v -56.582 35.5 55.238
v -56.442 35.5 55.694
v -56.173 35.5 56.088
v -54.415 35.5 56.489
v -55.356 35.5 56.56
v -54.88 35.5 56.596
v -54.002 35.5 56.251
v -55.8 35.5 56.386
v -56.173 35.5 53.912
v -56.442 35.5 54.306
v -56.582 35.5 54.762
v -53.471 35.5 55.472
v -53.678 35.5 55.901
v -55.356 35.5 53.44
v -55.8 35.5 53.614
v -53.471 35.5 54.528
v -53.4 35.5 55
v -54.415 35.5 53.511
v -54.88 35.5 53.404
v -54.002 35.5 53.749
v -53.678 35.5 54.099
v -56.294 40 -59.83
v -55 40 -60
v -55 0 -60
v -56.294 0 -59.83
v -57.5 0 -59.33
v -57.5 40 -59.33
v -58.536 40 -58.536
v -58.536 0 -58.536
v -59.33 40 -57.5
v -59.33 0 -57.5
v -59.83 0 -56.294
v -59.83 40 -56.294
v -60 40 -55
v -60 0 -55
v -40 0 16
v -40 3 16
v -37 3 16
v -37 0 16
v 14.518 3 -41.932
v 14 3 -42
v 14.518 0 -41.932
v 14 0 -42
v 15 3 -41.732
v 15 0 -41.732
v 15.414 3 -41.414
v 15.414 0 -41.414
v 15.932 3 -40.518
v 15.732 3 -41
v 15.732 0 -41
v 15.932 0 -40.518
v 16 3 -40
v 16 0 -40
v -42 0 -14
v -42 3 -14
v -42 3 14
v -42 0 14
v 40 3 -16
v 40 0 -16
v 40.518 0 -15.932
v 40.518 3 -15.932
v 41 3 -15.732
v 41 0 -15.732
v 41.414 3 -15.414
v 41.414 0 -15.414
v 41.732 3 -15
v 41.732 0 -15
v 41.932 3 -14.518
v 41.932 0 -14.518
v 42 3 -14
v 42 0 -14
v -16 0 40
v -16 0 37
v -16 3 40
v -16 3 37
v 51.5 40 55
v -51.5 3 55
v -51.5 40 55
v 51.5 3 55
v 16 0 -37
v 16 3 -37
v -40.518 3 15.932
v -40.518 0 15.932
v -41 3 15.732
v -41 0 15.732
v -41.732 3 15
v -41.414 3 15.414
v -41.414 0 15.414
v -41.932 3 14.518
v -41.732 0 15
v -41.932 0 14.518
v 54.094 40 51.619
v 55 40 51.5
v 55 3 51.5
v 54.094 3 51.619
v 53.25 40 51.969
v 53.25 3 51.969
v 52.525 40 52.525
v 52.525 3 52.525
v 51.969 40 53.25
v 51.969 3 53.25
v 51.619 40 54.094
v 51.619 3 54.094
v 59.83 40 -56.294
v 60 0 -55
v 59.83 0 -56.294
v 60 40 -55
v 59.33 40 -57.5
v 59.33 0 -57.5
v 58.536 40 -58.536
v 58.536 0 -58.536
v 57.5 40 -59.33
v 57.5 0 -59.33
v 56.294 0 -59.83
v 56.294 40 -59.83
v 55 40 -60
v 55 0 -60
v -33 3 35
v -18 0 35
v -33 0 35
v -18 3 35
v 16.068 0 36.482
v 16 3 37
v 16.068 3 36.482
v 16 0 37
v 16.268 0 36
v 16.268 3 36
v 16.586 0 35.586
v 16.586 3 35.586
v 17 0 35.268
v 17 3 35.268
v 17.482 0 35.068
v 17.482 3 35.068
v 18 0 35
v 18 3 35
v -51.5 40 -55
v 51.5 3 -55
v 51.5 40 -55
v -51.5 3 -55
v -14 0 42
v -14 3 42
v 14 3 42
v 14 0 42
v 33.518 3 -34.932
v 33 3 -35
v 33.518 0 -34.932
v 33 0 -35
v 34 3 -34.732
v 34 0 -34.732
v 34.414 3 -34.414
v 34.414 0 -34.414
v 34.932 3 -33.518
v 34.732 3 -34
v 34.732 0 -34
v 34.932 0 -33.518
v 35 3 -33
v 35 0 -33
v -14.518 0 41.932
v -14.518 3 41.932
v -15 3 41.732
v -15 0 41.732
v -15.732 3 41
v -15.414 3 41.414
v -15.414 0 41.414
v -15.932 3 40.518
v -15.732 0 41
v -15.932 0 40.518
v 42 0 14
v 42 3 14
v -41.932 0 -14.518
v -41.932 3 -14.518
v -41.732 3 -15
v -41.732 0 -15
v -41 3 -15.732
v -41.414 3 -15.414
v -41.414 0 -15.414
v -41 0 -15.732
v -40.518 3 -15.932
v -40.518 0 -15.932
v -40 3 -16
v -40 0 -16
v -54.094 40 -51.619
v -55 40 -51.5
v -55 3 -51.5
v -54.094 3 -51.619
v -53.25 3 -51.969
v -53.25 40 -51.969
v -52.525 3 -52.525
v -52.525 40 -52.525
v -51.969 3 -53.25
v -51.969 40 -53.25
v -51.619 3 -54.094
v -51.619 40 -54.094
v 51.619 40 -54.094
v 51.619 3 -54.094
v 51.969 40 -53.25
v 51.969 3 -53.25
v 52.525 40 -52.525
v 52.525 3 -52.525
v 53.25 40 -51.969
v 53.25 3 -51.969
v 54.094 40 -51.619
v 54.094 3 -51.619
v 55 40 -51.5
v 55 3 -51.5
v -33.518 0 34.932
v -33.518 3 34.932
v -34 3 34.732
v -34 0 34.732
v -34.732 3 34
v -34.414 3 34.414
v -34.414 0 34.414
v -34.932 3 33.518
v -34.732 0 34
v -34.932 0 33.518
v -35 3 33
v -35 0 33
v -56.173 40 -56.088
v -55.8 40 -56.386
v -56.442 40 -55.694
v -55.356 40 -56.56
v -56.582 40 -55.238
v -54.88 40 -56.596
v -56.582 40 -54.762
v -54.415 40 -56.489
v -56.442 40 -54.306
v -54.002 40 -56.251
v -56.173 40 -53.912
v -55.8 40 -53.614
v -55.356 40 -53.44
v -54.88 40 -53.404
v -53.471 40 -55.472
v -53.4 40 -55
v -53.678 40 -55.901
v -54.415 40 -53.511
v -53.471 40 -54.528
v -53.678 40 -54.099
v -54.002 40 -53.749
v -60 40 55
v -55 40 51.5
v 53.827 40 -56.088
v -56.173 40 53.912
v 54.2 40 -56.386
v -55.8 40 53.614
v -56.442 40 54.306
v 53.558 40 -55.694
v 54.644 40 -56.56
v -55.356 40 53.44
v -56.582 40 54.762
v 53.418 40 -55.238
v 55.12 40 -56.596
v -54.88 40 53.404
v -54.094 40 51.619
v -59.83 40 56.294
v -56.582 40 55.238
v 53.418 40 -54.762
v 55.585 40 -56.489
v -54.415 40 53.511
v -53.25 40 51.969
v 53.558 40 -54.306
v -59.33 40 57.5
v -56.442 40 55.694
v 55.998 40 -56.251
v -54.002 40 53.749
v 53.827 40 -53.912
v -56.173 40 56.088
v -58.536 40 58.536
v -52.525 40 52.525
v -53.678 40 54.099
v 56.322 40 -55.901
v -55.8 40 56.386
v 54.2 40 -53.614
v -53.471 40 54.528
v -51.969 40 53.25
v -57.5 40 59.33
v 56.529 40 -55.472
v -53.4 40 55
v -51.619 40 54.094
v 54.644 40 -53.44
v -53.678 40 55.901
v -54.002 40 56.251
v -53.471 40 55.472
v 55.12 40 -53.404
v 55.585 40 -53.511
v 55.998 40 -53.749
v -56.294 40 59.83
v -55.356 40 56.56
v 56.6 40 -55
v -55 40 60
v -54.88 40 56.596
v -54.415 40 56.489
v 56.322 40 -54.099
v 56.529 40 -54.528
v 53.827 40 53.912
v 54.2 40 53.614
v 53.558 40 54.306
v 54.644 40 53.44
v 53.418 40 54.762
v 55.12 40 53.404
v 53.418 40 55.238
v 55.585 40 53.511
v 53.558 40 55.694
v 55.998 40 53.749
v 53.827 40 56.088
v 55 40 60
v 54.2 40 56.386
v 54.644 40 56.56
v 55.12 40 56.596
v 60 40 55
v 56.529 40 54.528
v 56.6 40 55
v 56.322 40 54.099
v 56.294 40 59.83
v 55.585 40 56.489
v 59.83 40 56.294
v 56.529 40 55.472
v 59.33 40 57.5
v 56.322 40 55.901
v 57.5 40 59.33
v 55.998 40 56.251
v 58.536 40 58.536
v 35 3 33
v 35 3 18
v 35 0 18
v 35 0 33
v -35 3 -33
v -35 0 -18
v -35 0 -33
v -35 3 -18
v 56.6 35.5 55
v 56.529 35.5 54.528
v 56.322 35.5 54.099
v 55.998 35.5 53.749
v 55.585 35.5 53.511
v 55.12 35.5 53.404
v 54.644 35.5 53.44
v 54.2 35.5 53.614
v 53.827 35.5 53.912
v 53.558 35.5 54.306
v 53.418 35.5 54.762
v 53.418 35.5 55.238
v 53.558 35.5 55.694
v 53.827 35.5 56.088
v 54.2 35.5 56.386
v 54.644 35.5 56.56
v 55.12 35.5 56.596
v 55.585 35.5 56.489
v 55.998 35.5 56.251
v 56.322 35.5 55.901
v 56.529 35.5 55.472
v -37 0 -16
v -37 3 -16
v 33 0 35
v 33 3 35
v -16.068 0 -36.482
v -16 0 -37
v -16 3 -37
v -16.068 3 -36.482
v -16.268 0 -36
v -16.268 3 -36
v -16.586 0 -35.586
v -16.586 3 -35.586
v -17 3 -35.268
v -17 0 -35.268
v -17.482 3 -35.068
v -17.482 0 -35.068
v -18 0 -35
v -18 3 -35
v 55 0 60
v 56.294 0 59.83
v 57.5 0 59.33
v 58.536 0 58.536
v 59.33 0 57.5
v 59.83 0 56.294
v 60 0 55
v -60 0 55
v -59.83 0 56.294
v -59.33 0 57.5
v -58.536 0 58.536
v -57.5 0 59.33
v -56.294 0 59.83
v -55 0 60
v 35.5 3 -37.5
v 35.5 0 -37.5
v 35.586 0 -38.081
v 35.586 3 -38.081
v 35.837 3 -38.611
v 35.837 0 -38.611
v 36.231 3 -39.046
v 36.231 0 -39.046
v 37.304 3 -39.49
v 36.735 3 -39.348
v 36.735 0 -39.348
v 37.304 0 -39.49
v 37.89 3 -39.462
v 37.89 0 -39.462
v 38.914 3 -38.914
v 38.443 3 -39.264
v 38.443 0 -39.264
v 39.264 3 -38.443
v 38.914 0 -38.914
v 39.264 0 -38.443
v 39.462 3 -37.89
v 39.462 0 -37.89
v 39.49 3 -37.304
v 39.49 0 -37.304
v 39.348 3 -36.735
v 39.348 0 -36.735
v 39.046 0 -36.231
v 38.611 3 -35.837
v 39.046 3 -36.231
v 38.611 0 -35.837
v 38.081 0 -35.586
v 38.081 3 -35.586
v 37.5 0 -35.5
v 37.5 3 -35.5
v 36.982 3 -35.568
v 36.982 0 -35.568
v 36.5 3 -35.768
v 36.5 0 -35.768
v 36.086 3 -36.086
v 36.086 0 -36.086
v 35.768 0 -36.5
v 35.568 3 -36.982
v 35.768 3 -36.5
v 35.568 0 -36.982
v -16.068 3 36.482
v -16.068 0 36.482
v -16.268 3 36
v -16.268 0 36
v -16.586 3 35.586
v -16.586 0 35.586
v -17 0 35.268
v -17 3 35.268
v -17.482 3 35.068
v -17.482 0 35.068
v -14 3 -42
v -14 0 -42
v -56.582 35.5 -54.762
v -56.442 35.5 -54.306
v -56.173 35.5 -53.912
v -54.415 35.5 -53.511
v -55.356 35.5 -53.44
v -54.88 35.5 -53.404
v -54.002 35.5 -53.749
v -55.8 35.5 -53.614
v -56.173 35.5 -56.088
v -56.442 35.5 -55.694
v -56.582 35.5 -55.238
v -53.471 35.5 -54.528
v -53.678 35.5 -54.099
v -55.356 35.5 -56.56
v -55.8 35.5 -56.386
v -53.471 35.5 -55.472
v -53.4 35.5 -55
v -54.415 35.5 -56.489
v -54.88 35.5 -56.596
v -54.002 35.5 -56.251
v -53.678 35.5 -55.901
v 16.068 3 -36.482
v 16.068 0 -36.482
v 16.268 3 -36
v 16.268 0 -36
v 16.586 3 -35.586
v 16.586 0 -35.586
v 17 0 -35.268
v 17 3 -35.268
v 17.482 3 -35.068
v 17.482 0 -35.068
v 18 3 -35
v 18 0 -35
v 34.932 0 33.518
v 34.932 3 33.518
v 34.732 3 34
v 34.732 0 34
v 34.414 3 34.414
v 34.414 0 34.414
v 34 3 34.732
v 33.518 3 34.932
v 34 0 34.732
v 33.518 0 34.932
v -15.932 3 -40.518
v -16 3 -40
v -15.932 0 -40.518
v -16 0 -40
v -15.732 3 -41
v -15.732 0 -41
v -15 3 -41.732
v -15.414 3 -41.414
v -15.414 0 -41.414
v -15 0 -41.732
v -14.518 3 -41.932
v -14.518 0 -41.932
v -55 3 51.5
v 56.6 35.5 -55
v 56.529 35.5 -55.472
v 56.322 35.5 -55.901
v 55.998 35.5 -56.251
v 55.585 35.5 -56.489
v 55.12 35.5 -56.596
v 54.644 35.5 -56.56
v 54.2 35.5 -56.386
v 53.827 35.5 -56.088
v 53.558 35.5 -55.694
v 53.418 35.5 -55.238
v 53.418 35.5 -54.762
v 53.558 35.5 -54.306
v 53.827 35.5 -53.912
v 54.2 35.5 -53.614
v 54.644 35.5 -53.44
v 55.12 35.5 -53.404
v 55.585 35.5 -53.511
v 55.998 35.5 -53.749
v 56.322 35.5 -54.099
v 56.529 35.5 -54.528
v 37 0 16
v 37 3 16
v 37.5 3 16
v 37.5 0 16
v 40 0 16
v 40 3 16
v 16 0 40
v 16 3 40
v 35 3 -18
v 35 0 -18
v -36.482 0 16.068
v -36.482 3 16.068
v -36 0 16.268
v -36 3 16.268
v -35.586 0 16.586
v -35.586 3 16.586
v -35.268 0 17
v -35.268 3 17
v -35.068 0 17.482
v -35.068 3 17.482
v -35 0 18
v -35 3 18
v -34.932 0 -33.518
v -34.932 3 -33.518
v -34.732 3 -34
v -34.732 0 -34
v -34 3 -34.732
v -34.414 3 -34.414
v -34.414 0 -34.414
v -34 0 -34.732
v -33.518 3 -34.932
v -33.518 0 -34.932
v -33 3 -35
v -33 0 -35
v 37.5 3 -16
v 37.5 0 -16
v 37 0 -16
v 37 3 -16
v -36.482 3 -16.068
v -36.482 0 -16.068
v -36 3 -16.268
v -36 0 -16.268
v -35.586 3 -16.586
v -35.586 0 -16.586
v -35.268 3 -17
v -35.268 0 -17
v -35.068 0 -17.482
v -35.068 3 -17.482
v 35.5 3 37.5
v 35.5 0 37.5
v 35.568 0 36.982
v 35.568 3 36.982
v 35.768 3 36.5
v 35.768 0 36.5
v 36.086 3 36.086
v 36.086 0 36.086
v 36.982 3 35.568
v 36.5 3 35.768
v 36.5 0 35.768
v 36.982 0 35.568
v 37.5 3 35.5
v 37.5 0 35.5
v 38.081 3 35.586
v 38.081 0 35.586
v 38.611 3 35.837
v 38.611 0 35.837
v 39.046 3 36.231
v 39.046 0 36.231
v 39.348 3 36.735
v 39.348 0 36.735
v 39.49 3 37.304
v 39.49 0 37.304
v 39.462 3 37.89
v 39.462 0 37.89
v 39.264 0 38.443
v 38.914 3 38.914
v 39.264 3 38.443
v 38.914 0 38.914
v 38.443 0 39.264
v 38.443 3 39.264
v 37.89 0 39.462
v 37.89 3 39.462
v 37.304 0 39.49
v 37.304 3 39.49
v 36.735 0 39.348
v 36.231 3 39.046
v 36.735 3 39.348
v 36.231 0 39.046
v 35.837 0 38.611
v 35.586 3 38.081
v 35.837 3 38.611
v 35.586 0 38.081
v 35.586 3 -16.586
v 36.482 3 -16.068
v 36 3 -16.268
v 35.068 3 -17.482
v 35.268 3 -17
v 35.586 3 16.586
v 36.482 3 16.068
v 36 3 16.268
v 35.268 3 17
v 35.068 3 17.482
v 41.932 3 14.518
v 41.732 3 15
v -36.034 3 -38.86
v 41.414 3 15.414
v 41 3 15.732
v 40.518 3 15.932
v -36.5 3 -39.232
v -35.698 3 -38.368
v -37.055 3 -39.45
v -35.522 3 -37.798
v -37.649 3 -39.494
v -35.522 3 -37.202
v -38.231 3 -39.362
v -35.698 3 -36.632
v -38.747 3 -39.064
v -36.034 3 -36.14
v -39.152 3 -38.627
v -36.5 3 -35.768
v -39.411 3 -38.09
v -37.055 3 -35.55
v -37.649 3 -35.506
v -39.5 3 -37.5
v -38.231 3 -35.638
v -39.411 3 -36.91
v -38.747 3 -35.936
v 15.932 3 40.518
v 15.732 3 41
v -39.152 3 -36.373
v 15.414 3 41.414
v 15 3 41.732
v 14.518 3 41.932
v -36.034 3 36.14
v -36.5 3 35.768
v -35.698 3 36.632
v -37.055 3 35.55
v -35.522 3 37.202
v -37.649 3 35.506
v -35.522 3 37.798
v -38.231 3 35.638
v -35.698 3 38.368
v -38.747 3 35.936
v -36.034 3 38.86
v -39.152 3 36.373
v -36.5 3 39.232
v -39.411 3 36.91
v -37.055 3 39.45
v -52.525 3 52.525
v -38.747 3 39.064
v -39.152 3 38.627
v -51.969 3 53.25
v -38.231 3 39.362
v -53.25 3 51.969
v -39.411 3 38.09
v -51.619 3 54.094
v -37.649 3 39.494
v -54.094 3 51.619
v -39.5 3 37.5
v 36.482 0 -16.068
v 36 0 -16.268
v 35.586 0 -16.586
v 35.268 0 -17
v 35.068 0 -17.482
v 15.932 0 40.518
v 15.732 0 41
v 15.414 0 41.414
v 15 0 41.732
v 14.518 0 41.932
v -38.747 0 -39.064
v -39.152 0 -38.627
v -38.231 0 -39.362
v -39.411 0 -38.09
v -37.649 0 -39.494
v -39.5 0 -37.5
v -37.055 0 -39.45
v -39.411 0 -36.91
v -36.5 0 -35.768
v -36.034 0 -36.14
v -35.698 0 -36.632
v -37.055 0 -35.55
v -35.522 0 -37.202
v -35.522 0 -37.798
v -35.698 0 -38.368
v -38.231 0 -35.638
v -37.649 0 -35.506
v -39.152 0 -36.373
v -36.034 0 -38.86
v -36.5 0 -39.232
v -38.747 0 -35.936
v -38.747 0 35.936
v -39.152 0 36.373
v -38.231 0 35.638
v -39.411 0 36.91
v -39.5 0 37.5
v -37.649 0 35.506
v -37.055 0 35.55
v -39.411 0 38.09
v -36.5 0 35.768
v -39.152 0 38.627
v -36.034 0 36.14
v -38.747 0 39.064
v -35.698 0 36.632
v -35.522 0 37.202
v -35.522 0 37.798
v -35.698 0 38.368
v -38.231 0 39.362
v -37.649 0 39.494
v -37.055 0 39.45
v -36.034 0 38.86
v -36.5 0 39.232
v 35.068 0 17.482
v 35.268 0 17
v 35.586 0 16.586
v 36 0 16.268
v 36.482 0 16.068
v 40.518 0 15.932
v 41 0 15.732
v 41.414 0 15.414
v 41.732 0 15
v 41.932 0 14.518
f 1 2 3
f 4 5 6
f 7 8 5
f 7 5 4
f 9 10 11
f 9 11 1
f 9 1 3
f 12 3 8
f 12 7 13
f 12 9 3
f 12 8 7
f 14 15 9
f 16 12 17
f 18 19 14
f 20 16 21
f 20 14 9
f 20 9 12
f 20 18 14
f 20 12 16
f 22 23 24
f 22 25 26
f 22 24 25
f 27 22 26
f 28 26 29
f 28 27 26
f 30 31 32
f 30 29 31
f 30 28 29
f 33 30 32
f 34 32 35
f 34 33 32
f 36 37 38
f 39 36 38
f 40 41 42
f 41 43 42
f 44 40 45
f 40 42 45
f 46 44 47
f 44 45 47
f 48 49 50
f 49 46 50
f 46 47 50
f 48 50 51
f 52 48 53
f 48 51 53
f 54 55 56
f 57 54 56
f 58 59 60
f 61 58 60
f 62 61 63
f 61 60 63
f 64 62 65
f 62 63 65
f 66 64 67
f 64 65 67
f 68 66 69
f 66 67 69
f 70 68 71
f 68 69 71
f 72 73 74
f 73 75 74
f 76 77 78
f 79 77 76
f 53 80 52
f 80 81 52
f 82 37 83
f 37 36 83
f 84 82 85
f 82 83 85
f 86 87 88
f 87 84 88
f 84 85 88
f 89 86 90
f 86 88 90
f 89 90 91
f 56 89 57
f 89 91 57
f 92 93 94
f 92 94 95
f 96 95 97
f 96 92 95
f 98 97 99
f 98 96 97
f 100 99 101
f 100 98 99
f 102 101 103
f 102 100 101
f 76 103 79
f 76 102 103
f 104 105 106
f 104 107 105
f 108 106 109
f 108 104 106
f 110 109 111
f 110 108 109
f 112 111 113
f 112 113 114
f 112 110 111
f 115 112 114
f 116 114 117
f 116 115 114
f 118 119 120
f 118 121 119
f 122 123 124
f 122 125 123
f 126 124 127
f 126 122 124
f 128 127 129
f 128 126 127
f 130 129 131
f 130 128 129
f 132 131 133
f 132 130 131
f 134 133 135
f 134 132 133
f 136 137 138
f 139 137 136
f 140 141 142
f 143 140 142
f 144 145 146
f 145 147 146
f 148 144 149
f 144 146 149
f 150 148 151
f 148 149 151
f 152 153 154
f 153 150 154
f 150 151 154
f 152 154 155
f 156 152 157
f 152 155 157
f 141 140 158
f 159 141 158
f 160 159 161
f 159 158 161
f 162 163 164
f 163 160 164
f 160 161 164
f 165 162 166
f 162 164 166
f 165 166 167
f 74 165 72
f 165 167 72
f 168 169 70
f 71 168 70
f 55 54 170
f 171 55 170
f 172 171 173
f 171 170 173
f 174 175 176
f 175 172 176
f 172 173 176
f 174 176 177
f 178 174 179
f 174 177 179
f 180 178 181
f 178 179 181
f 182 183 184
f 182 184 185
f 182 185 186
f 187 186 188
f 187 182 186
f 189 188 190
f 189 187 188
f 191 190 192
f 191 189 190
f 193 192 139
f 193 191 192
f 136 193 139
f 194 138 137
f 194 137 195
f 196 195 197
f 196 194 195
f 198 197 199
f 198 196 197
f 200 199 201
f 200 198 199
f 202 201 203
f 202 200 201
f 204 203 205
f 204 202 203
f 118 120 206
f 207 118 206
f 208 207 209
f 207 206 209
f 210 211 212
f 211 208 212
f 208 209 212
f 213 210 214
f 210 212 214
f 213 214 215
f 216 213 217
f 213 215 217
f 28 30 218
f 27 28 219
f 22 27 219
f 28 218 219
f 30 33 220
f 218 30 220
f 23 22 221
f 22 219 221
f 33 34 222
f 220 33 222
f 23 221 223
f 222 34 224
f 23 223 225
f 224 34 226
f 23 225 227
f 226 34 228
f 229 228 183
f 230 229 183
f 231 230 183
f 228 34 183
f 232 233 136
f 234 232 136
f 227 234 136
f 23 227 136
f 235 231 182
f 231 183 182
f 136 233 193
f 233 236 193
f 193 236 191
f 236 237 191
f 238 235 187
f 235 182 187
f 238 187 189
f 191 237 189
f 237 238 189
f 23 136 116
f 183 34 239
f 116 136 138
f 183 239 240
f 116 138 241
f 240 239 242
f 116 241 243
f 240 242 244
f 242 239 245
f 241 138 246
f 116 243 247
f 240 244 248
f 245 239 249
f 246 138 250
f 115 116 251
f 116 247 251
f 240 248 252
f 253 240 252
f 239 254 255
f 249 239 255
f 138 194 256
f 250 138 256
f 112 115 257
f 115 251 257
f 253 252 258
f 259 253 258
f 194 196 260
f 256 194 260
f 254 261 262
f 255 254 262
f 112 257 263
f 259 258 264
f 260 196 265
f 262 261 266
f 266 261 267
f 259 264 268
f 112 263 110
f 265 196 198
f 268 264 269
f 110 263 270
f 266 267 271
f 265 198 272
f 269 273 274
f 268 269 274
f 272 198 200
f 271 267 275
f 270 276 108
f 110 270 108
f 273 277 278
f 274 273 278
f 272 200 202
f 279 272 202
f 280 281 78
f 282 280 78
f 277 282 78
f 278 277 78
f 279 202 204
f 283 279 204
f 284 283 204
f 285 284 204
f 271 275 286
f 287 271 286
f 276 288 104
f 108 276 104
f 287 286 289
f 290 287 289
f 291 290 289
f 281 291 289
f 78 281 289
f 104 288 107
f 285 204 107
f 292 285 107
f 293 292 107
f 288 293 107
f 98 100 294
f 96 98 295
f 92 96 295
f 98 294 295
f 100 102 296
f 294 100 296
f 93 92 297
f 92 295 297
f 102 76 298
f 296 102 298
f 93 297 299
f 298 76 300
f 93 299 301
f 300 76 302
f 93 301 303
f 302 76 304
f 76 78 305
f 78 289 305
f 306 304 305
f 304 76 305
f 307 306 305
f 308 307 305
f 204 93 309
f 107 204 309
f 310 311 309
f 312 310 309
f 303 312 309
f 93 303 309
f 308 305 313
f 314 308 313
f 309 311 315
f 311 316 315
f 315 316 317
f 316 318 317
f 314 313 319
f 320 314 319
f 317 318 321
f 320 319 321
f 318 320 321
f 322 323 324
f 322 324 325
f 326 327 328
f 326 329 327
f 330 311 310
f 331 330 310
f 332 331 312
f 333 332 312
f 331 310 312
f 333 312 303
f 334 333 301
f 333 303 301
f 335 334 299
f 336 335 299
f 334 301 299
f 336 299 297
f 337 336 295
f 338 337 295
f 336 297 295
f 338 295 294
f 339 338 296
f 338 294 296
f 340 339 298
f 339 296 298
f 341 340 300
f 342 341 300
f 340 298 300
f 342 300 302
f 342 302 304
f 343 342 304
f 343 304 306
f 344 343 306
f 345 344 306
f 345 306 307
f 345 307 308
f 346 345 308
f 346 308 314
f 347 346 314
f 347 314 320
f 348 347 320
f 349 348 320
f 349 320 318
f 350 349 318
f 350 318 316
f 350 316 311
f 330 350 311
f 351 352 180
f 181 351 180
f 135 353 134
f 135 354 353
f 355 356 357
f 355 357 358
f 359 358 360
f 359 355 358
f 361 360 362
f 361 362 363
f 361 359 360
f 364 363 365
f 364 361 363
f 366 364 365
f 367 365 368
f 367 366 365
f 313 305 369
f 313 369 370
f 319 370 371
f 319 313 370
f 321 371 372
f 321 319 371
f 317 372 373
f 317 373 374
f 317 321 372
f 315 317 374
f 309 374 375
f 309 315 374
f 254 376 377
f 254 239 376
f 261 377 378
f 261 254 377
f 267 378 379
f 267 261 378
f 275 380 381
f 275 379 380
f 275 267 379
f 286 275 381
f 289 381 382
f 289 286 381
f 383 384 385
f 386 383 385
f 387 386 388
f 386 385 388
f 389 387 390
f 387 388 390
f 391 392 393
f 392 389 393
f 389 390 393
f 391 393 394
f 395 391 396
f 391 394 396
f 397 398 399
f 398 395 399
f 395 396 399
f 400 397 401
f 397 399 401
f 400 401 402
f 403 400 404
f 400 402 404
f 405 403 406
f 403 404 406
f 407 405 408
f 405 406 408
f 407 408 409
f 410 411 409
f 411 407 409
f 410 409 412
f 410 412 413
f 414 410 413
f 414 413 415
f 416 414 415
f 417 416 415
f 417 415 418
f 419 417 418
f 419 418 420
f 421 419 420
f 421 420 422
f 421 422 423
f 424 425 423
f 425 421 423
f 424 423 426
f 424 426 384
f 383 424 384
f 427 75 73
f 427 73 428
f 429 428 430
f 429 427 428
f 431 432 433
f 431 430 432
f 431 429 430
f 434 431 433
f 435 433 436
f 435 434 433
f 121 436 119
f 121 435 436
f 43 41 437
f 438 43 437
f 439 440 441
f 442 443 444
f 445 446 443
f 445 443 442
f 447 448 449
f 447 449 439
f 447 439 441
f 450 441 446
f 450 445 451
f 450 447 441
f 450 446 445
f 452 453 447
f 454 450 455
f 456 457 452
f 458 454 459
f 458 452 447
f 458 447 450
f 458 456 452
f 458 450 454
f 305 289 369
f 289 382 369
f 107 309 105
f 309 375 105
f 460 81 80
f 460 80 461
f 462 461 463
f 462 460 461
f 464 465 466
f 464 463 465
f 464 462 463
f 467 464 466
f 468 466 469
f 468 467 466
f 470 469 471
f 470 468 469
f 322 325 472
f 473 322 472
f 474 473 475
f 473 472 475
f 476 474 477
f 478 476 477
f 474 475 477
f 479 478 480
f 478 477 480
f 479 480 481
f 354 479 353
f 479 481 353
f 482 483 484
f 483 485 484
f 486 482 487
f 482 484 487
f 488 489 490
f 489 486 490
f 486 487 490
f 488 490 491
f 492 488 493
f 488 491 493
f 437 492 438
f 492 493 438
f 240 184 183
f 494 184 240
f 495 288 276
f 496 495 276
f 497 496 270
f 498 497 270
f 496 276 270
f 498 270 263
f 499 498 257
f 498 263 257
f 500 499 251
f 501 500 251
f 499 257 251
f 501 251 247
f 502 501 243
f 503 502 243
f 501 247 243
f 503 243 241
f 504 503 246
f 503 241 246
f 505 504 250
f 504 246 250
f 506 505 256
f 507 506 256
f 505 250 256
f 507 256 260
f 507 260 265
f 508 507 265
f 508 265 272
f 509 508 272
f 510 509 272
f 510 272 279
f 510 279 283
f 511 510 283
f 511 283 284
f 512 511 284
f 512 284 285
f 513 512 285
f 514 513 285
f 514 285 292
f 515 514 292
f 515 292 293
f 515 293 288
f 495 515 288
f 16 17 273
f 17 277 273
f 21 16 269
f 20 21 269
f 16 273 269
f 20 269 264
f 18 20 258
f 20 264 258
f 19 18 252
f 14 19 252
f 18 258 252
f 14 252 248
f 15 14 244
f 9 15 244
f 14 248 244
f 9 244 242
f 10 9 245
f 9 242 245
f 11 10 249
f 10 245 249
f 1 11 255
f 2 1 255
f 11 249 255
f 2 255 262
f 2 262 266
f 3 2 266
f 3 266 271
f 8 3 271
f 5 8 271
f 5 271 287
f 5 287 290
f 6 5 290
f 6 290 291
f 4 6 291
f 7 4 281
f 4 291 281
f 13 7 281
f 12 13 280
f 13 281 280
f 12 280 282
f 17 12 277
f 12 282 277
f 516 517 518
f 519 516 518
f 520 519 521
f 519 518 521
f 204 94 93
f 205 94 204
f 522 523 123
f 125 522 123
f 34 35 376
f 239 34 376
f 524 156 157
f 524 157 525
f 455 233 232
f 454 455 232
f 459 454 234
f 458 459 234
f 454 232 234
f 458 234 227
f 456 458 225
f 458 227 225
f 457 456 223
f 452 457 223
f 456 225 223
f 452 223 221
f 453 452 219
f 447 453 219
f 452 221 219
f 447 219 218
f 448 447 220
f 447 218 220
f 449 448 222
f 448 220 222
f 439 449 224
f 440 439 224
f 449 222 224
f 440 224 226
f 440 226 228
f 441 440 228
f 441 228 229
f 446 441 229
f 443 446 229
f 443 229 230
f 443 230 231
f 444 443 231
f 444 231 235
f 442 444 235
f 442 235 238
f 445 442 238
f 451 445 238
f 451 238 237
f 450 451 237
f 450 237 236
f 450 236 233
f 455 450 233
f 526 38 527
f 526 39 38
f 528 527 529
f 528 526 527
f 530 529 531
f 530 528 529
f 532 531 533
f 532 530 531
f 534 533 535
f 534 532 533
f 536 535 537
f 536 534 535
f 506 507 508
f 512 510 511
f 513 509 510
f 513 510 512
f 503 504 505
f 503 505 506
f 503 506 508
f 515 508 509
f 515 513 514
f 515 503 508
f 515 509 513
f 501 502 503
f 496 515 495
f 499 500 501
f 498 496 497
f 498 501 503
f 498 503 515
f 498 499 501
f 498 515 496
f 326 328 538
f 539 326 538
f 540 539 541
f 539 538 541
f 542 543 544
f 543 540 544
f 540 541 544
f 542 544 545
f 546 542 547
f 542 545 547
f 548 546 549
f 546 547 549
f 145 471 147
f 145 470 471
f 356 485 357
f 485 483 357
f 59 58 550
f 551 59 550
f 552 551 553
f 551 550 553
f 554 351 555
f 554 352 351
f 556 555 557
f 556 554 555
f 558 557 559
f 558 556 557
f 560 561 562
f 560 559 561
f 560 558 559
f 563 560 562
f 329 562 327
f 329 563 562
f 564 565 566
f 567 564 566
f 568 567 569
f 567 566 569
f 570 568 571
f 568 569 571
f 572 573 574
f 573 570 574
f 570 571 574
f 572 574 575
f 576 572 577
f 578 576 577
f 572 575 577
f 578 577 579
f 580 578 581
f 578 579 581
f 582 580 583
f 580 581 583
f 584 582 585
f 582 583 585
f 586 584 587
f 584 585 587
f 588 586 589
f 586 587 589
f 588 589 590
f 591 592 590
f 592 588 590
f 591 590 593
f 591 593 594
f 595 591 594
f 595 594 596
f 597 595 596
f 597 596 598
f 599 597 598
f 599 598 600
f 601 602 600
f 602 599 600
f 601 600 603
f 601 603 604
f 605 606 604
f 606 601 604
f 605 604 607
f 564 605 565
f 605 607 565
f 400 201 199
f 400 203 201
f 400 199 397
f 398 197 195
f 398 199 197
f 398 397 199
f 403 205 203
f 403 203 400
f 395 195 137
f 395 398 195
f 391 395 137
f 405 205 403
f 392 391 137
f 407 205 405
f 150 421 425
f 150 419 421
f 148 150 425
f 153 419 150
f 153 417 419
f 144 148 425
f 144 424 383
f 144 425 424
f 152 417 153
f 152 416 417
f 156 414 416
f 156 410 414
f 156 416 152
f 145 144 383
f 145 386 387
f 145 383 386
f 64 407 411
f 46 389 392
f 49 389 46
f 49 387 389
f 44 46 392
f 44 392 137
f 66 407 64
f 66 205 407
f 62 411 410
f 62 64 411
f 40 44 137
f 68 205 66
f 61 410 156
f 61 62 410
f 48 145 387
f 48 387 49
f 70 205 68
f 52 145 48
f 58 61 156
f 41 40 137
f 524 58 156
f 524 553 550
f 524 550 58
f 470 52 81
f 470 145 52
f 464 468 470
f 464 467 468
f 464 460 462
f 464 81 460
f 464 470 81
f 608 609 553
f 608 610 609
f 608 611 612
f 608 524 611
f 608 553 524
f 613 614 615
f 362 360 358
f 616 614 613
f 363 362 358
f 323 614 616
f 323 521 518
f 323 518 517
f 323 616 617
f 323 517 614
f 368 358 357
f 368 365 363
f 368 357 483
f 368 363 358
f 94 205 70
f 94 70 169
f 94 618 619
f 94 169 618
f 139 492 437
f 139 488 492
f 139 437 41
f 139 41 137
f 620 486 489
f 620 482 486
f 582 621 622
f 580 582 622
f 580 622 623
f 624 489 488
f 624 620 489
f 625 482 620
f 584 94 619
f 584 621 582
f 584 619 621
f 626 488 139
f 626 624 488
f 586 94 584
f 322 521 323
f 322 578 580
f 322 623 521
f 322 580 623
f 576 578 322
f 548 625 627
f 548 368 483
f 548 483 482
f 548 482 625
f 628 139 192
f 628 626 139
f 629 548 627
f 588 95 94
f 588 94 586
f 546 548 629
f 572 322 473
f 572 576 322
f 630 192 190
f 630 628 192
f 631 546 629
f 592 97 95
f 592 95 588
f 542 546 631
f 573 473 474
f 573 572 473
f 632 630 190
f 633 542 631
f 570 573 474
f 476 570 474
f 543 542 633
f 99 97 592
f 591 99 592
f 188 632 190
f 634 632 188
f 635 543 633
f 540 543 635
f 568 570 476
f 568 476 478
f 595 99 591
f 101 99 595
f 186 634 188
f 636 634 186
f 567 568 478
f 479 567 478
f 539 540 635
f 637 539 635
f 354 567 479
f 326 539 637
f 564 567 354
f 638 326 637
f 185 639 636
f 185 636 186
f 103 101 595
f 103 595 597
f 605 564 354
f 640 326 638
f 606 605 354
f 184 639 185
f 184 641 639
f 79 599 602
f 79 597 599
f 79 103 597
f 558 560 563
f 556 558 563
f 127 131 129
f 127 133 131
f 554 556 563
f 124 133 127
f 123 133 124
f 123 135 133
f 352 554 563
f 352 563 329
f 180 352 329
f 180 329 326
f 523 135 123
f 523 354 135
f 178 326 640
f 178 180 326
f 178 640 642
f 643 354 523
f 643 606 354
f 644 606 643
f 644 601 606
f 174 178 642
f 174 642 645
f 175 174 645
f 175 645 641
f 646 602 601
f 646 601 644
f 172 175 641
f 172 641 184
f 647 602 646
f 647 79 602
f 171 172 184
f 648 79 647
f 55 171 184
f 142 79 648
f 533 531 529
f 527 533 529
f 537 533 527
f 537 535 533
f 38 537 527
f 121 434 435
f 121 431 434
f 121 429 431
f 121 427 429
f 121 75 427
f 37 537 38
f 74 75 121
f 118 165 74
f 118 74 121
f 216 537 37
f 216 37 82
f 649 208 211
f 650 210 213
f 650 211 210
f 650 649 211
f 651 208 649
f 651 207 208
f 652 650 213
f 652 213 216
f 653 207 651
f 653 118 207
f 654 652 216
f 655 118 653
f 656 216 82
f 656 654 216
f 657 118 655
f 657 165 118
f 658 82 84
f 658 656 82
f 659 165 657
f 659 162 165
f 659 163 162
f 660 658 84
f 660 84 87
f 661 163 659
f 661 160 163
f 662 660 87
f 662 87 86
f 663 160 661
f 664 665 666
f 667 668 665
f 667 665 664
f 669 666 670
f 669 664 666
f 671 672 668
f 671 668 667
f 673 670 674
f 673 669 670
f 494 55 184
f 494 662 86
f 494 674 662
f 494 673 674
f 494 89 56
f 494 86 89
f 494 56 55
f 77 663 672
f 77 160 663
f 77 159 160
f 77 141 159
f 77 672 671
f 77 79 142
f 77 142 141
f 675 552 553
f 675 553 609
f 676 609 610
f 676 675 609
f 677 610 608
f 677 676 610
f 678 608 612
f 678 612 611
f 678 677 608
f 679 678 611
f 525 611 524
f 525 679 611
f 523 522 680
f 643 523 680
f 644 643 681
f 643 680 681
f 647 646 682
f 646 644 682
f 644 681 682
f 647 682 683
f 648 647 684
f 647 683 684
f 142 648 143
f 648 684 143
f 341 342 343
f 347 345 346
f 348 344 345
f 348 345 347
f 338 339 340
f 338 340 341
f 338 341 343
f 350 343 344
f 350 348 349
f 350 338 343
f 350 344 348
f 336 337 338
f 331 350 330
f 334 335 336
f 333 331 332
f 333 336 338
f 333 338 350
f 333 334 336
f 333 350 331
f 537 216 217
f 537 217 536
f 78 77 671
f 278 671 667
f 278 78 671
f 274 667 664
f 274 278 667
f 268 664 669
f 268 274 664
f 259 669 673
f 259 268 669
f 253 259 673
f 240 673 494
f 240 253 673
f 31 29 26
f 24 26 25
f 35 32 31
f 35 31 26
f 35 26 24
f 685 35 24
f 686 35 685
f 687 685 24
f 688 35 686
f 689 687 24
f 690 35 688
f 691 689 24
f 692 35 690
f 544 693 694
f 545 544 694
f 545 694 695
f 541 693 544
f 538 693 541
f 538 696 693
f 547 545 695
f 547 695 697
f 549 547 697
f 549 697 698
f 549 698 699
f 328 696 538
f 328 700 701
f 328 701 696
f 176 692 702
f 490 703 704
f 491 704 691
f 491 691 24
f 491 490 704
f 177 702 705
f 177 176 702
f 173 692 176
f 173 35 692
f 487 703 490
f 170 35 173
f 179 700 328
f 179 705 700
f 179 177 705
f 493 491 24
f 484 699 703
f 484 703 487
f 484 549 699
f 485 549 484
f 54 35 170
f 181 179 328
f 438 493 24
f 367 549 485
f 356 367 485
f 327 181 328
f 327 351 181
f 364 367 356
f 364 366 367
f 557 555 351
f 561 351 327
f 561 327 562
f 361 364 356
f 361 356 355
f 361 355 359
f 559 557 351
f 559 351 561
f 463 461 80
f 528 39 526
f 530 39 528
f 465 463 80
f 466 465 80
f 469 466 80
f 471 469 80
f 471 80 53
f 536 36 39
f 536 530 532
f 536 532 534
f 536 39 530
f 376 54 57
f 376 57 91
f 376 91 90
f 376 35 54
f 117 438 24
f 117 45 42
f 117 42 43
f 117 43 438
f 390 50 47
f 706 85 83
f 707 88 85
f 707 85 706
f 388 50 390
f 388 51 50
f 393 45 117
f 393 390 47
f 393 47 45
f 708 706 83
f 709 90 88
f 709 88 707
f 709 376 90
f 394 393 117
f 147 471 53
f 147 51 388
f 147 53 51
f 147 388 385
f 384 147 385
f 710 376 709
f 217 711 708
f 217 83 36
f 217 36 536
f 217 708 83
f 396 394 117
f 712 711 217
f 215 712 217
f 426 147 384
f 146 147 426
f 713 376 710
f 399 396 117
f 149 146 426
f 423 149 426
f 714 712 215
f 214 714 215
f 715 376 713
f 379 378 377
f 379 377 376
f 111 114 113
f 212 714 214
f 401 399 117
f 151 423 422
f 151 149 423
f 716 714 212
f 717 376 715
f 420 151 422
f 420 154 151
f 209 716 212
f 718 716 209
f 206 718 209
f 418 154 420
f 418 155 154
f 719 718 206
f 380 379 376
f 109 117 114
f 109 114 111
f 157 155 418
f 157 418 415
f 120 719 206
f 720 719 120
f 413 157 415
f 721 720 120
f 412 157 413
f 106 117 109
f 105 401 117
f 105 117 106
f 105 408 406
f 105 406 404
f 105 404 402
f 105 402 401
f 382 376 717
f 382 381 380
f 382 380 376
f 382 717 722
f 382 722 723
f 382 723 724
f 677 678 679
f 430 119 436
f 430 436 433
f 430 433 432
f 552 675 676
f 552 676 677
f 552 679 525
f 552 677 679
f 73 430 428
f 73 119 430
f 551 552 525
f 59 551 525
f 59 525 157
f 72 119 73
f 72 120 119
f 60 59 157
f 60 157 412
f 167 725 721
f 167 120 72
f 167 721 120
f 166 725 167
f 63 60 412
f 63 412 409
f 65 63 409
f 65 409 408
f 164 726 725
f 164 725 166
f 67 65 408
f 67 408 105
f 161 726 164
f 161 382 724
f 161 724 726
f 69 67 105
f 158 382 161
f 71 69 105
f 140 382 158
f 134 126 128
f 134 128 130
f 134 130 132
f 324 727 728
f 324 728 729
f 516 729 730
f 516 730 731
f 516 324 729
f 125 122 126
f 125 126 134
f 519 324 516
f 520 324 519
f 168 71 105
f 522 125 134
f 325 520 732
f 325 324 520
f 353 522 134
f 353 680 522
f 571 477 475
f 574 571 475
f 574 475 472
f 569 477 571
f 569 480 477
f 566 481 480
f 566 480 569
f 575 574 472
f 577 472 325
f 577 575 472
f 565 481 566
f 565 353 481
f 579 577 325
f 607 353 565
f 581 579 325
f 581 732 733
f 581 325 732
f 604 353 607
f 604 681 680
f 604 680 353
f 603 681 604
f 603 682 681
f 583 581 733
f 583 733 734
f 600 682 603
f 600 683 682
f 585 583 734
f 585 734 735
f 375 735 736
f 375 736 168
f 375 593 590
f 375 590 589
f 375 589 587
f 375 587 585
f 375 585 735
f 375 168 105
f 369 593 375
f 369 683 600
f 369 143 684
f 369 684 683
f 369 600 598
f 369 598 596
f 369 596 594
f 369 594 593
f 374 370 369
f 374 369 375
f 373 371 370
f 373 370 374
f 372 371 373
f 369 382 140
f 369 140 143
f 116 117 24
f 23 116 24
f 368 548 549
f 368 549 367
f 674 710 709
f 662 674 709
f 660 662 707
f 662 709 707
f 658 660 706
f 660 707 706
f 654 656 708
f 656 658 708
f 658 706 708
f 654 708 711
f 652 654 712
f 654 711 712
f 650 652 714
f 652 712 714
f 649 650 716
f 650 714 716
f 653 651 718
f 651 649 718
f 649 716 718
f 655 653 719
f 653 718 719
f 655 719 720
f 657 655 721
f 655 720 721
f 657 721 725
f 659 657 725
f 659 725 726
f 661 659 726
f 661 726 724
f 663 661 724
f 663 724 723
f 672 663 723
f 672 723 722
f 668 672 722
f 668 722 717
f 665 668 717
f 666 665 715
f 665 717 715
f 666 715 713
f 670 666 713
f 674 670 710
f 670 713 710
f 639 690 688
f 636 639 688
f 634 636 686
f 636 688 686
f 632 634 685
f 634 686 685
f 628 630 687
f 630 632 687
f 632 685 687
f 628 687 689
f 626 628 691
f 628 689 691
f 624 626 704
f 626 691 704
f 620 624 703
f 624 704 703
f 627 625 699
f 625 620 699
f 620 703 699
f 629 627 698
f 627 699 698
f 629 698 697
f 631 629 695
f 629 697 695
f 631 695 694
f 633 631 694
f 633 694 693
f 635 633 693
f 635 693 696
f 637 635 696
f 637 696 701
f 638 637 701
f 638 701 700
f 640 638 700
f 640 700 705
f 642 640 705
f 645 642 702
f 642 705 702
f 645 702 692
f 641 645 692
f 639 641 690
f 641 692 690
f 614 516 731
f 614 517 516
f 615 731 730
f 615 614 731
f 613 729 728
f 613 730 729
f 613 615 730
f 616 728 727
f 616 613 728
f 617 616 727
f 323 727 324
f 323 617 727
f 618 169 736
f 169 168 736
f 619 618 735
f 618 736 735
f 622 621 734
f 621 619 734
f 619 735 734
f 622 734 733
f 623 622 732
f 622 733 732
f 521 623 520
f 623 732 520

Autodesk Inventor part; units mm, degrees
ref_plane "YZ Plane" through (0, 0, 0) normal (1, 0, 0) x (0, 1, 0)
ref_plane "XZ Plane" through (0, 0, 0) normal (0, 1, 0) x (-1, 0, 0)
ref_plane "XY Plane" through (0, 0, 0) normal (0, 0, 1) x (1, 0, 0)
sketch "Sketch1" plane through (0, 0, 0) normal (0, 1, 0) x (-1, 0, 0)
  line L0 (-55, 55) -> (55, 55)
  line L1 (55, 55) -> (55, -55)
  line L2 (55, -55) -> (-55, -55)
  line L3 (-55, -55) -> (-55, 55)
  line L4 (-55, 55) -> (55, -55) construction
  line L5 (55, 55) -> (-55, -55) construction
  line L6 (-12.5, 37.5) -> (12.5, 37.5) construction
  line L7 (12.5, 37.5) -> (12.5, -37.5) construction
  line L8 (12.5, -37.5) -> (-12.5, -37.5) construction
  line L9 (-12.5, -37.5) -> (-12.5, 37.5) construction
  line L10 (-12.5, 37.5) -> (12.5, -37.5) construction
  line L11 (12.5, 37.5) -> (-12.5, -37.5) construction
  line L12 (-37.5, 37.5) -> (37.5, 37.5) construction
  line L13 (37.5, 37.5) -> (37.5, -37.5) construction
  line L14 (37.5, -37.5) -> (-37.5, -37.5) construction
  line L15 (-37.5, -37.5) -> (-37.5, 37.5)
  line L16 (-37.5, 37.5) -> (37.5, -37.5) construction
  line L17 (37.5, 37.5) -> (-37.5, -37.5) construction
  circle A0 centre (37.5, -37.5) radius 2
  circle A1 centre (37.5, 37.5) radius 2
  circle A2 centre (-37.5, 37.5) radius 2
  circle A3 centre (-37.5, -37.5) radius 2
  point P0 (0, 0)
  dimension "d0" = 110
  dimension "d1" = 110
  dimension "d2" = 25
  dimension "d3" = 75
  dimension "d4" = 75
  dimension "d5" = 4
  dimension "d6" = 4
  dimension "d7" = 4
  dimension "d8" = 4
extrude "Extrusion1" add sketch "Sketch1" along normal blind 3
sketch "Sketch3" plane through (0, 3, 0) normal (0, 1, 0) x (1, 0, 0)
  line L0 (35, -35) -> (-35, -35)
  line L1 (-35, -35) -> (-35, 35)
  line L2 (-35, 35) -> (35, 35)
  line L3 (35, 35) -> (35, -35)
  line L4 (35, -35) -> (-35, 35) construction
  line L5 (-35, -35) -> (35, 35) construction
  point P0 (0, 0)
  dimension "d18" = 70
  dimension "d19" = 70
extrude "Extrusion3" cut sketch "Sketch3" against normal blind 3
fillet "Fillet1" radius 2 4 edges at (-35, 1.5, 35) (-35, 1.5, -35) (35, 1.5, -35) (35, 1.5, 35)
sketch "Sketch4" plane through (0, 3, 0) normal (0, 1, 0) x (1, 0, 0)
  line L0 (28, -16) -> (42, -16)
  line L1 (42, -16) -> (42, 16)
  line L2 (42, 16) -> (28, 16)
  line L3 (28, 16) -> (28, -16)
  line L4 (28, -16) -> (42, 16) construction
  line L5 (42, -16) -> (28, 16) construction
  line L6 (35, 33) -> (35, -33) projected
  point P0 (0, 0)
  point P1 (35, 0)
  dimension "d23" = 14
  dimension "d24" = 32
extrude "Extrusion4" cut sketch "Sketch4" against normal blind 3
pattern_circular "Circular Pattern2" count 4 over 360 about axis through (0, 0, 0) along (0, 1, 0) of "Extrusion4"
fillet "Fillet2" radius 2 16 edges at (16, 1.5, 35) (-16, 1.5, 35) (16, 1.5, 42) (-16, 1.5, 42) (-35, 1.5, 16) (-42, 1.5, 16) (-42, 1.5, -16) (-35, 1.5, -16) (-16, 1.5, -35) (-16, 1.5, -42) (16, 1.5, -42) (16, 1.5, -35) (35, 1.5, -16) (42, 1.5, -16) (42, 1.5, 16) (35, 1.5, 16)
sketch "Sketch5" plane through (0, 0, 0) normal (0, -1, 0) x (1, 0, 0)
  line L0 (55, -55) -> (-55, -55) projected
  line L1 (-55, 55) -> (55, 55)
  line L2 (55, 55) -> (55, -55)
  line L3 (55, -55) -> (-55, -55)
  line L4 (-55, -55) -> (-55, 55)
  line L5 (-55, 55) -> (55, -55) construction
  line L6 (55, 55) -> (-55, -55) construction
  line L7 (-60, 60) -> (60, 60)
  line L8 (60, 60) -> (60, -60)
  line L9 (60, -60) -> (-60, -60)
  line L10 (-60, -60) -> (-60, 60)
  line L11 (-60, 60) -> (60, -60) construction
  line L12 (60, 60) -> (-60, -60) construction
  point P0 (0, 0)
  dimension "d31" = 5
extrude "Extrusion5" add sketch "Sketch5" against normal blind 40
sketch "Sketch6" plane through (0, 40, 0) normal (0, 1, 0) x (1, 0, 0)
  line L0 (-55, -55) -> (55, -55) projected
  circle A0 centre (-55, -55) radius 3.5
  line L1 (-55, -55) -> (-55, 55) projected
  circle A1 centre (-55, 55) radius 3.5
  line L2 (55, 55) -> (55, -55) projected
  circle A2 centre (55, 55) radius 3.5
  circle A3 centre (55, -55) radius 3.5
  point P0 (0, 0)
  dimension "d34" = 7
  dimension "d35" = 7
  dimension "d36" = 7
  dimension "d37" = 7
extrude "Extrusion6" add sketch "Sketch6" against normal up to surface (37 mm away)
sketch "Sketch7" plane through (0, 40, 0) normal (0, 1, 0) x (1, 0, 0)
  arc A0 (55, -51.5) -> (51.5, -55) centre (55, -55) ccw projected
  circle A1 centre (55, -55) radius 1.6
  arc A2 (51.5, 55) -> (55, 51.5) centre (55, 55) ccw projected
  circle A3 centre (55, 55) radius 1.6
  arc A4 (-55, 51.5) -> (-51.5, 55) centre (-55, 55) ccw projected
  circle A5 centre (-55, 55) radius 1.6
  arc A6 (-51.5, -55) -> (-55, -51.5) centre (-55, -55) ccw projected
  circle A7 centre (-55, -55) radius 1.6
  point P0 (0, 0)
  dimension "d40" = 3.2
  dimension "d41" = 3.2
  dimension "d42" = 3.2
  dimension "d43" = 3.2
extrude "Extrusion7" cut sketch "Sketch7" against normal blind 4.5
fillet "Fillet3" radius 5 4 edges at (60, 20, -60) (-60, 20, -60) (60, 20, 60) (-60, 20, 60)
properties part number "3D printed box"
